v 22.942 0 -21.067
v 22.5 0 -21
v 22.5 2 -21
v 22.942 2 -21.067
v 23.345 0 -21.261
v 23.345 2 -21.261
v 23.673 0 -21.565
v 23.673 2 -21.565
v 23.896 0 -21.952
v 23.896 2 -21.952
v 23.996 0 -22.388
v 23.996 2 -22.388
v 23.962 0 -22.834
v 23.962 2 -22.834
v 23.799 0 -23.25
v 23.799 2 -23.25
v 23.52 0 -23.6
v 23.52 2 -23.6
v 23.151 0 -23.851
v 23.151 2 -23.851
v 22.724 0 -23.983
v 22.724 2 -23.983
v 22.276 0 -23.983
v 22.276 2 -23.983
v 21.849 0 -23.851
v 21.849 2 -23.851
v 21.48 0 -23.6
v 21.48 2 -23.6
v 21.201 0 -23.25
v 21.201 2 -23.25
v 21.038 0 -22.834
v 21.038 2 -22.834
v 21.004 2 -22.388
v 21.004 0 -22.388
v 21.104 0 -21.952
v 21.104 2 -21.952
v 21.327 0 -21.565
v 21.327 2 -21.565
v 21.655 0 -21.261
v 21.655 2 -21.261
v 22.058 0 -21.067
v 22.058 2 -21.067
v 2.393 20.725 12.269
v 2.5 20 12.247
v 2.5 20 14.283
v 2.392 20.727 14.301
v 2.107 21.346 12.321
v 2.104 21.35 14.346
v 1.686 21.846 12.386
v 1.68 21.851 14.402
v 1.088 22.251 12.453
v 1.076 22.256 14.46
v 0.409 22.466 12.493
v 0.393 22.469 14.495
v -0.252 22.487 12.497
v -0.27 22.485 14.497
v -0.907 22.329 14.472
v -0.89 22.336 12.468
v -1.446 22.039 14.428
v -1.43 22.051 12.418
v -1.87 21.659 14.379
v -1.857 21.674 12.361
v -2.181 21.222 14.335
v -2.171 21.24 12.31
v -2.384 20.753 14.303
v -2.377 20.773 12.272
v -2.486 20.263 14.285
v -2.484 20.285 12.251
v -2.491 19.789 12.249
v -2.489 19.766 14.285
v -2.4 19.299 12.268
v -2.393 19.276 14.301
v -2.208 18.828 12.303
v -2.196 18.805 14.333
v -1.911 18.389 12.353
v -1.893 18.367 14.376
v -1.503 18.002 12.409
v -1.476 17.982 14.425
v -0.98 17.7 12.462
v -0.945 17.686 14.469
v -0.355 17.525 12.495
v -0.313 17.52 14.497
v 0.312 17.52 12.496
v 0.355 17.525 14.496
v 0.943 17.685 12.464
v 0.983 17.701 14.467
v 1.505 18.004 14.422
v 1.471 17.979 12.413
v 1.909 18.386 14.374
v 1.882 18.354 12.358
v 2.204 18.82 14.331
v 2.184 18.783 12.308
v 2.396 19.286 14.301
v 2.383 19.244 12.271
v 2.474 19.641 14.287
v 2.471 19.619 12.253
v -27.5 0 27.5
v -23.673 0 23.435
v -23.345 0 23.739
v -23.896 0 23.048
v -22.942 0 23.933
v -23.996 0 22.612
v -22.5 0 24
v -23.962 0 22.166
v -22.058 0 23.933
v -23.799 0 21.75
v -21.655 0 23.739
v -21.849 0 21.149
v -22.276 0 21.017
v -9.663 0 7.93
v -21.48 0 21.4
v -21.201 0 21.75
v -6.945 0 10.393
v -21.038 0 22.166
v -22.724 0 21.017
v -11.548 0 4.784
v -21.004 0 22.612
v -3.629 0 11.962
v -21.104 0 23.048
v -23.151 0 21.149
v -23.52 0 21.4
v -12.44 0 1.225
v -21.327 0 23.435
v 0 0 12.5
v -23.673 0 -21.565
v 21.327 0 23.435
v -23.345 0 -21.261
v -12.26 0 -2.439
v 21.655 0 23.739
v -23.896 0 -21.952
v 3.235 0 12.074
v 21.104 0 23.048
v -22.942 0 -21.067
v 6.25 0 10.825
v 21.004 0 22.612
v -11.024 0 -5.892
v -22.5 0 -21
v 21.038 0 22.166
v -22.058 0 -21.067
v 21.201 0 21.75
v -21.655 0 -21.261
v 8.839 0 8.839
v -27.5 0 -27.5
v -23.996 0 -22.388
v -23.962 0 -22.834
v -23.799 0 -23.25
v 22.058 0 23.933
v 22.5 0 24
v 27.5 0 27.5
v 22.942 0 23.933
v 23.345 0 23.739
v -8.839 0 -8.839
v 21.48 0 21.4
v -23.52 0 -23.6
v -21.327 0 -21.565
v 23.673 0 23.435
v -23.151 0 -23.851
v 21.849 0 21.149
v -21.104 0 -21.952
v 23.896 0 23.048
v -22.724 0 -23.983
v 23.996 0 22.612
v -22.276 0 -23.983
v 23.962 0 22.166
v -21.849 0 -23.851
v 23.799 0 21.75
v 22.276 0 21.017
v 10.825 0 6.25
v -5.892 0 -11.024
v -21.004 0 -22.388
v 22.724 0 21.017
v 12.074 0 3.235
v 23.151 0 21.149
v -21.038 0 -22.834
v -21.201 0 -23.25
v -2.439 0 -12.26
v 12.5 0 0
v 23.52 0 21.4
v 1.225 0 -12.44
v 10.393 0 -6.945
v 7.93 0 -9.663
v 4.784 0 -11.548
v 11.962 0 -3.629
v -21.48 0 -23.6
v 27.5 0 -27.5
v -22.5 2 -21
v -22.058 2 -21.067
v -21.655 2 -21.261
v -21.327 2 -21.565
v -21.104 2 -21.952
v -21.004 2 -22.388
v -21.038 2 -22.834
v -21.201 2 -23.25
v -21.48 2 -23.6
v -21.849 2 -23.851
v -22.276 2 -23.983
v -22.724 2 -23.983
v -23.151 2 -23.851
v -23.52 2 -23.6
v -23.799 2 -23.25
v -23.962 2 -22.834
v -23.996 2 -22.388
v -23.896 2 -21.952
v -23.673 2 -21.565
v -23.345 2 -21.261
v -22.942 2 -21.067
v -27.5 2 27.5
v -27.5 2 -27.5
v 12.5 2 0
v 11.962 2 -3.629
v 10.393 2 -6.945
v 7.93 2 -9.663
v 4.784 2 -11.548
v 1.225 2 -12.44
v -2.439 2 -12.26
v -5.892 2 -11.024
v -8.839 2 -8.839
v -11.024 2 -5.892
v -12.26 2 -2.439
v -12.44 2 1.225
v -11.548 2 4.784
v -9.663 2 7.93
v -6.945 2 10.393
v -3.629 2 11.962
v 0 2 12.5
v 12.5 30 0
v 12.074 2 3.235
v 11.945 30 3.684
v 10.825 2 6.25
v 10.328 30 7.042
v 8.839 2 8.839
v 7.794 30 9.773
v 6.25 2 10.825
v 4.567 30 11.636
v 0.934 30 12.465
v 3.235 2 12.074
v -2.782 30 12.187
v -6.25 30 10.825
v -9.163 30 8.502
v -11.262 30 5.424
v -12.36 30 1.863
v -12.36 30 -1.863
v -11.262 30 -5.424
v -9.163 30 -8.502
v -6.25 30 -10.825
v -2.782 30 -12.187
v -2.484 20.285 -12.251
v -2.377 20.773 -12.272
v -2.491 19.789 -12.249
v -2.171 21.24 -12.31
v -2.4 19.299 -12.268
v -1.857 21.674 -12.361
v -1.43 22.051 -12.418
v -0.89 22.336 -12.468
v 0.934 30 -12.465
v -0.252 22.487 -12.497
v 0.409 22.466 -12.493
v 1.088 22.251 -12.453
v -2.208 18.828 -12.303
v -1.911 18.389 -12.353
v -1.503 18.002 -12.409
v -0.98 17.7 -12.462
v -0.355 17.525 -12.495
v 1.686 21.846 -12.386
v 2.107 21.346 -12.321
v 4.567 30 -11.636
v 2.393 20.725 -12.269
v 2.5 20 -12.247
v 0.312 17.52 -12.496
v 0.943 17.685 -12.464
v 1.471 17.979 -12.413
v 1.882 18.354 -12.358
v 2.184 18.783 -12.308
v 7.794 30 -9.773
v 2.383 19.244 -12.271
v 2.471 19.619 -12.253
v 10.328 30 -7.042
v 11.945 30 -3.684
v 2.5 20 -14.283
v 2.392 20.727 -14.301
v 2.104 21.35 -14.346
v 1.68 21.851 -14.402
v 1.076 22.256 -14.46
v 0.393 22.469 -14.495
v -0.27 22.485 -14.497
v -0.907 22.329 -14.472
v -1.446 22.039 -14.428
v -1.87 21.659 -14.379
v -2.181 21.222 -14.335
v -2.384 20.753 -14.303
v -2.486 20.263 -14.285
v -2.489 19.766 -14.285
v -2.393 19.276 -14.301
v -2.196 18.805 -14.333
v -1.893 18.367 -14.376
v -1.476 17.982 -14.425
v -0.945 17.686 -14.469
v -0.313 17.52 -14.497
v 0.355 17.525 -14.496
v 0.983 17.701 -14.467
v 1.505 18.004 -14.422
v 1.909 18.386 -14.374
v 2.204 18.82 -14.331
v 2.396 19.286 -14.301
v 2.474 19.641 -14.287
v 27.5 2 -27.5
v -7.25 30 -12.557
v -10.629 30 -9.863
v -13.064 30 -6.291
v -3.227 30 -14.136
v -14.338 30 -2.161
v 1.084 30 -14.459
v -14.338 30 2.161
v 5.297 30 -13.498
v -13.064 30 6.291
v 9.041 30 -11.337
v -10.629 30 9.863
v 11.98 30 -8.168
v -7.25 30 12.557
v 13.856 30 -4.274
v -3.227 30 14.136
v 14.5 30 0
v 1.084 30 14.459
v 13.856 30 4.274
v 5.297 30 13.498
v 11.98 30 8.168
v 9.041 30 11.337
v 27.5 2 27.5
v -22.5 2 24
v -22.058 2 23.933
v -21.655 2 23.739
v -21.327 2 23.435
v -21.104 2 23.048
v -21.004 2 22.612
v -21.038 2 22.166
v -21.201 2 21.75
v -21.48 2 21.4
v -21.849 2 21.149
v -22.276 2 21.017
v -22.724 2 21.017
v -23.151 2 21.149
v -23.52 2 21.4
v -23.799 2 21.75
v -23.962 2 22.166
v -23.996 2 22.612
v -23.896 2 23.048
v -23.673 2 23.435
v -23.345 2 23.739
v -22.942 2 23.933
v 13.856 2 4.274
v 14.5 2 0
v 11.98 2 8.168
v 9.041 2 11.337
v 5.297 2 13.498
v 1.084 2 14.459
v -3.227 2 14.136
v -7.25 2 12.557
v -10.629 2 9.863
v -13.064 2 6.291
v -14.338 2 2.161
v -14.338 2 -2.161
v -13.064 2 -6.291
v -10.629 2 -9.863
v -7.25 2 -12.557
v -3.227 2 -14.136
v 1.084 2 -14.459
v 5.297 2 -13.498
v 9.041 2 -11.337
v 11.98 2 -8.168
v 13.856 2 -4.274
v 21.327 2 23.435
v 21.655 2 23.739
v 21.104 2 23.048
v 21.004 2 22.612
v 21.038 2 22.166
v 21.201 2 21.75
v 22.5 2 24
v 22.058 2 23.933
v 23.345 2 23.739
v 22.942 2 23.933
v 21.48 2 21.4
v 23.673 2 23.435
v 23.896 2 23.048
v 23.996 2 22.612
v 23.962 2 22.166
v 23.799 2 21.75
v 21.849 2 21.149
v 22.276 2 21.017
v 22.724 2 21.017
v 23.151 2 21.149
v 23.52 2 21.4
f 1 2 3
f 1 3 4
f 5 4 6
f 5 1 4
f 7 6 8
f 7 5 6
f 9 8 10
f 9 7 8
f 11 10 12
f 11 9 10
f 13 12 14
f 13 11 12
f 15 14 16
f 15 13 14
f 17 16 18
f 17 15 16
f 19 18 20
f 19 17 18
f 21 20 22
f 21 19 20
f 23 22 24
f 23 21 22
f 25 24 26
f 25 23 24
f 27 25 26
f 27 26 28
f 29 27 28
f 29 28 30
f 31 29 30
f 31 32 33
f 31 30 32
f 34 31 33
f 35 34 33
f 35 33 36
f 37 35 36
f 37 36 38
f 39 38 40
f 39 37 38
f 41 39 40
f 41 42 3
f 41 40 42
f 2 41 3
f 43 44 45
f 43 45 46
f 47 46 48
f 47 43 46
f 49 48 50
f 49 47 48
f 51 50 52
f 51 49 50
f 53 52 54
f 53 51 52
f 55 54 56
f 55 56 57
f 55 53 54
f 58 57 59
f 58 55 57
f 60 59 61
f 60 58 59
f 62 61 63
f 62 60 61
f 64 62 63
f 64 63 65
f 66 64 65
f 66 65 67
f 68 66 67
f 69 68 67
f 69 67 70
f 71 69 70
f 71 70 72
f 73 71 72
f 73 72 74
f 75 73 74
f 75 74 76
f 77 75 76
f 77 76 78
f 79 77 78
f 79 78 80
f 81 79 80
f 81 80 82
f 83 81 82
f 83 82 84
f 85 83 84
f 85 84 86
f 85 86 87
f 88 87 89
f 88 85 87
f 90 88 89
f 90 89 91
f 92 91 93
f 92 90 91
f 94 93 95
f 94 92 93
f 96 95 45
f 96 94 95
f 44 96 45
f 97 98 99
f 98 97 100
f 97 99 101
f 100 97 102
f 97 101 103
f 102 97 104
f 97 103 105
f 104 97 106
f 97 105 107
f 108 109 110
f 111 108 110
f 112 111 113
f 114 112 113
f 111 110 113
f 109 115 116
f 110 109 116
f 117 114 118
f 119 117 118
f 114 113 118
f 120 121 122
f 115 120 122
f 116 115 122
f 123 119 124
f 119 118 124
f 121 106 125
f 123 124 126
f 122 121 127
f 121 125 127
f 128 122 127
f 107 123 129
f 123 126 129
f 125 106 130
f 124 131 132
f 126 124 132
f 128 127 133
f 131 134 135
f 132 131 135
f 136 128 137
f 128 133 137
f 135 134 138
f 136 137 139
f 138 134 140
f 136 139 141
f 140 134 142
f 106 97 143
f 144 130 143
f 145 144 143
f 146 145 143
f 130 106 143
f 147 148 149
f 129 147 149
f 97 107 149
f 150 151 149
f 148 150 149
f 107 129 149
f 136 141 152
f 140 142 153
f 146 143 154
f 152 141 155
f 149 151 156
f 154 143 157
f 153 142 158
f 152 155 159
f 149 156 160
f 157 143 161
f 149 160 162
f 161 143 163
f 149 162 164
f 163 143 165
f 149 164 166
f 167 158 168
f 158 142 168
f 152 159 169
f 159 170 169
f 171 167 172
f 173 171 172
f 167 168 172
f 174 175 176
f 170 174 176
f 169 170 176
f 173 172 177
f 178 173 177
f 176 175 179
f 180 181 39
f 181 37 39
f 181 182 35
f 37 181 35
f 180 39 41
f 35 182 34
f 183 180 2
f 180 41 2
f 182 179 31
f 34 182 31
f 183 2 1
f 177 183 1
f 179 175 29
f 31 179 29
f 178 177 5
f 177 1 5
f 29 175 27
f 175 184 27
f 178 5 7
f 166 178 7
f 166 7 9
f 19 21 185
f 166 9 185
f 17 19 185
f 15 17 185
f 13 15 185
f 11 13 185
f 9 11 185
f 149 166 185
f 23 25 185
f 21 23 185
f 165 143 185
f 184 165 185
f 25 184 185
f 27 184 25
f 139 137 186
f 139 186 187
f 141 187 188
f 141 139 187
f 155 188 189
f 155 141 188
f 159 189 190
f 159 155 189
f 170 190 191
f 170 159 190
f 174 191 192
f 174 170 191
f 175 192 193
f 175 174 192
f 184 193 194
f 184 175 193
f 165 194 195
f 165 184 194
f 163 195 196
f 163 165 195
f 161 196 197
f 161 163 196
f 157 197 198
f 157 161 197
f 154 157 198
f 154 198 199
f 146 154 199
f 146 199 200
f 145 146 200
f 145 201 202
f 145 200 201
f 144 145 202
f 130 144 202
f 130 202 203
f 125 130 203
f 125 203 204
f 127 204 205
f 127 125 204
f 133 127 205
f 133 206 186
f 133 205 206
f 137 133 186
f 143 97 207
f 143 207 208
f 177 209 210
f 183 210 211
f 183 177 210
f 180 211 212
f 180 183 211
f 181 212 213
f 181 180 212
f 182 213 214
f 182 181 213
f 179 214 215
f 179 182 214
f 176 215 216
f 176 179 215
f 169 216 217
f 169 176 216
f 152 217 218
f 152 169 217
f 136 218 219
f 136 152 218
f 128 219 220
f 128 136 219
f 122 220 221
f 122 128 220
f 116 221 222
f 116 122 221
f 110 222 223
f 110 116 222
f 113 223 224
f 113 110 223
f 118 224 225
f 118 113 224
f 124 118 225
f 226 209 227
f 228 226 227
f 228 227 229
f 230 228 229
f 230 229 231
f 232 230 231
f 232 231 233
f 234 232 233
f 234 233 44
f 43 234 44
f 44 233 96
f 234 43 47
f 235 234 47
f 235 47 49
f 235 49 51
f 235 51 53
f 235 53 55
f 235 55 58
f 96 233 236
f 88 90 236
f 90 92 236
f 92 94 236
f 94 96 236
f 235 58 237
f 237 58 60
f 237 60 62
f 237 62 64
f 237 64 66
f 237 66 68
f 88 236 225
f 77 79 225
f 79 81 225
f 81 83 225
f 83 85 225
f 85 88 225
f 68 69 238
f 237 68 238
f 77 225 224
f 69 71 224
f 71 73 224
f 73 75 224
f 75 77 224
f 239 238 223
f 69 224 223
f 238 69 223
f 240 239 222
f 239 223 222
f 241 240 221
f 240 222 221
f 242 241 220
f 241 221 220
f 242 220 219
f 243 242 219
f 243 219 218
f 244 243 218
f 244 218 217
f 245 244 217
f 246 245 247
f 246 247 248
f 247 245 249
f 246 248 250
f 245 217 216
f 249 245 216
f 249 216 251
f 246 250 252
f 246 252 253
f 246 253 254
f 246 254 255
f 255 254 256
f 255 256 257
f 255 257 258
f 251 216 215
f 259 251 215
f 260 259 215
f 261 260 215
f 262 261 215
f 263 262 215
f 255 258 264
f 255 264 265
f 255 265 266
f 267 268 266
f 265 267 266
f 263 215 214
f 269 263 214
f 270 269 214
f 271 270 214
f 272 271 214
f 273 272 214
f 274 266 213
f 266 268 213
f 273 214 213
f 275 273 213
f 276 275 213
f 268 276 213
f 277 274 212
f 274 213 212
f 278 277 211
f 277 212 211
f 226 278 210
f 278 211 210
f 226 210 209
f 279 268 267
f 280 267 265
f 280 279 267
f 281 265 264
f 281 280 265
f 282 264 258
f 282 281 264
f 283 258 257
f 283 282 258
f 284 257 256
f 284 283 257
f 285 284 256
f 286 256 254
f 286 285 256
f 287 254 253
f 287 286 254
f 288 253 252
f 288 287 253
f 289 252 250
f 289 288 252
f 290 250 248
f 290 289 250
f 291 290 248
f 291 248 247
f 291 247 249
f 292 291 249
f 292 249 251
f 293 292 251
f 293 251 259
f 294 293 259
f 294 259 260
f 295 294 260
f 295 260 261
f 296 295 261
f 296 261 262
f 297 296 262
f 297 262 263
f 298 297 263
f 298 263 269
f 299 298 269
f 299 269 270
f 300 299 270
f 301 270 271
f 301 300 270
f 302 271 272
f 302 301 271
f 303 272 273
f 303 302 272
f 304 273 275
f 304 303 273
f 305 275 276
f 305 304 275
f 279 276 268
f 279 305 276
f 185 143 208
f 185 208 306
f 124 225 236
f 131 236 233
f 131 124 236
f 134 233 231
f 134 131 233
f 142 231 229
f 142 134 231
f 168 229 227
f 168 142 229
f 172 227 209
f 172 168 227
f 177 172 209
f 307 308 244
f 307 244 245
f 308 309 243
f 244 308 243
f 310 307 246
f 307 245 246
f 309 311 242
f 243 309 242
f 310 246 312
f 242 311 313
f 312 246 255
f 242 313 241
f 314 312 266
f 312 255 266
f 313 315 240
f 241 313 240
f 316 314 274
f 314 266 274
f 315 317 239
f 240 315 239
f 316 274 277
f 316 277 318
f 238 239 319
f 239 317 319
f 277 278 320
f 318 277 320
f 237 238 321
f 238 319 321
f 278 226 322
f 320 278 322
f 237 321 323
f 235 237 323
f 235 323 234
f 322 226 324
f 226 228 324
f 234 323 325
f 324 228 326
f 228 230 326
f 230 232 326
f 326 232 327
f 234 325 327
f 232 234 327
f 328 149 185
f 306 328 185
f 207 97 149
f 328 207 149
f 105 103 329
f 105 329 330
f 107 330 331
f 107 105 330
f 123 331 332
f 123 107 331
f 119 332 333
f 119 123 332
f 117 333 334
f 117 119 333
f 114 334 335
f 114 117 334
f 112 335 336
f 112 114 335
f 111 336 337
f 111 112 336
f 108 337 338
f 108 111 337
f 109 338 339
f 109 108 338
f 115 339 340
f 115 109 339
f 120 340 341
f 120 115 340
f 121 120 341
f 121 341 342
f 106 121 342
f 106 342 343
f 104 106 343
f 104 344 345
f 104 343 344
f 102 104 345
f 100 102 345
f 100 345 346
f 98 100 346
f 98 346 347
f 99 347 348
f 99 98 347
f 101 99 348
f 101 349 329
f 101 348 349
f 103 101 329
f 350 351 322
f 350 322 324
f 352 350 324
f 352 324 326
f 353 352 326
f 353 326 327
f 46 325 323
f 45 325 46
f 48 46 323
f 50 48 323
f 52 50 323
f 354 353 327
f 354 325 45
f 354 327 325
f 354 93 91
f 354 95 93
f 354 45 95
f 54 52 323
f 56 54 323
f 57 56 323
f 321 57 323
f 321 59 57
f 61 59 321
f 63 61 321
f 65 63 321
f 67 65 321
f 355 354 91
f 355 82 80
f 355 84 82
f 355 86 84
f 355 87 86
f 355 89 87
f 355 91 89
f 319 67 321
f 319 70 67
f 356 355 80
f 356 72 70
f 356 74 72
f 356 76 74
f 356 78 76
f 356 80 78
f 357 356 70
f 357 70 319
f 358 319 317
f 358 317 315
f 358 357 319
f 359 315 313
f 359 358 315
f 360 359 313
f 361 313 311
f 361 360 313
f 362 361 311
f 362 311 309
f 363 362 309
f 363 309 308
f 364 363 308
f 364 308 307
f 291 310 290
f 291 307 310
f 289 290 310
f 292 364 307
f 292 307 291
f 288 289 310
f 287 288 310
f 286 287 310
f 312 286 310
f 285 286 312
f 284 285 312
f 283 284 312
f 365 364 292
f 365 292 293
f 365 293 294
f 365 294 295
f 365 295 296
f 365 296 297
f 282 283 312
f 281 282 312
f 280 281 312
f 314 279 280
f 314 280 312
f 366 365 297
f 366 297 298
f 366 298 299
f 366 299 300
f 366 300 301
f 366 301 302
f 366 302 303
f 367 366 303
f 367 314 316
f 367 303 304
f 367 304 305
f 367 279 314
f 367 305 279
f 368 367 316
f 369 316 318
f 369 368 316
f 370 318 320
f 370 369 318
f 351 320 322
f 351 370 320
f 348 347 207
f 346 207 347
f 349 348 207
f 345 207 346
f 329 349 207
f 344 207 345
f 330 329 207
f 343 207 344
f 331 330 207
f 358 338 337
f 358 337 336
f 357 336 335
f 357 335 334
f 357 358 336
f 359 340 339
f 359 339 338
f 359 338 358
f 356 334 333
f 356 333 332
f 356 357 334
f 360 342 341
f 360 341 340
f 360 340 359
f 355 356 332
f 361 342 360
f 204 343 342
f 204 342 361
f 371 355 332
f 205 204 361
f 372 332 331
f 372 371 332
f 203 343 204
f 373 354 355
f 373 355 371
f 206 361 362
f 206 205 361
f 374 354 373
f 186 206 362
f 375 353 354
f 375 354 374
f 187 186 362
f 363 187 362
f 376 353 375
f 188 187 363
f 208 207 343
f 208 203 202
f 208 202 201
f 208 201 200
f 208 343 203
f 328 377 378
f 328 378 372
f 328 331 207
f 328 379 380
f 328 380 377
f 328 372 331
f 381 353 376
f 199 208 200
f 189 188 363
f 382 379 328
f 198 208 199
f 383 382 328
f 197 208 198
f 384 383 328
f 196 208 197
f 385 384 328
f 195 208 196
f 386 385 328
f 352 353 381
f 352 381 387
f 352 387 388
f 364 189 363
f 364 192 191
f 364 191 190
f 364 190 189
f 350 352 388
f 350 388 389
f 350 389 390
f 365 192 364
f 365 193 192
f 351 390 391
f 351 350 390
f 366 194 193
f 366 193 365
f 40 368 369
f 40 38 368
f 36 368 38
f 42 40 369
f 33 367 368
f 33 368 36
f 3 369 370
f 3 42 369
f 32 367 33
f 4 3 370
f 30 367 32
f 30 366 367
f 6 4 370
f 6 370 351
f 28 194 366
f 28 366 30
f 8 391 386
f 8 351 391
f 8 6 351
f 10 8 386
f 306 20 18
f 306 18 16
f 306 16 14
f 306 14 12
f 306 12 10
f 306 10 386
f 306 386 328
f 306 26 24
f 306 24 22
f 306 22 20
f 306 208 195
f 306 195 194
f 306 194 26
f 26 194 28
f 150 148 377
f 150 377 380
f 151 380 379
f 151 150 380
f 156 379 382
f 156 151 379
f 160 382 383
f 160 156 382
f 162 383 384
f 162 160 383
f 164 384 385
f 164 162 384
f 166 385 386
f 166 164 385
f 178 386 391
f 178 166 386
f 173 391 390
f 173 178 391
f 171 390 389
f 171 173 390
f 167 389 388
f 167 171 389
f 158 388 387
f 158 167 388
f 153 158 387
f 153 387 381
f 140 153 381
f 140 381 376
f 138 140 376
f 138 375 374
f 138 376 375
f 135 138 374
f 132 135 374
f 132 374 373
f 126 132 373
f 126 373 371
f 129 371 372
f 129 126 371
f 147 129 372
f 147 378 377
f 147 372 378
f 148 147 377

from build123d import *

# Parameters (mm, degrees)
SKETCH_1_W               = 55
SKETCH_1_H               = 55
SKETCH_1_R               = 12.5
EXTRUDE_1_DEPTH          = 2
SKETCH_2_R               = 14.5
SKETCH_2_R_2             = 12.5
EXTRUDE_1_2_DEPTH        = 30
CUT_EXTRUDE_1_DEPTH      = 50.117206761
CUT_EXTRUDE_1_DEPTH_BACK = 50.117206761
SKETCH_3_R               = 2.5
CUT_EXTRUDE_7_DEPTH      = 50.117206822
CUT_EXTRUDE_7_DEPTH_BACK = 50.117206822
SKETCH_4_R               = 1.5


with BuildPart() as part:
    # Эскиз1 → Extrude 1 (new body)
    with BuildSketch(Plane(origin=(0, 0, 0), x_dir=(1, 0, 0), z_dir=(0, 1, 0))):
        Rectangle(SKETCH_1_W, SKETCH_1_H)
        with Locations(Location((0, 0, 0), (0, 0, 270))):
            Circle(SKETCH_1_R, mode=Mode.SUBTRACT)
    extrude(amount=EXTRUDE_1_DEPTH)

    # Эскиз2 → Extrude 1 2 (add)
    with BuildSketch(Plane.XZ):
        Circle(SKETCH_2_R)
        Circle(SKETCH_2_R_2, mode=Mode.SUBTRACT)
    extrude(amount=-EXTRUDE_1_2_DEPTH)

    # Эскиз3 → Вырез-Вытянуть1 (cut, two sides: drawn at the far end of the back side and taken through both)
    with BuildSketch(Plane.XY.offset(-CUT_EXTRUDE_1_DEPTH_BACK)):
        with Locations((0, 20)):
            Circle(SKETCH_3_R)
    extrude(amount=CUT_EXTRUDE_1_DEPTH + CUT_EXTRUDE_1_DEPTH_BACK, mode=Mode.SUBTRACT)

    # Эскиз4 → Вырез-Вытянуть7 (cut, two sides: drawn at the far end of the back side and taken through both)
    with BuildSketch(Plane(origin=(0, 0, 0), x_dir=(1, 0, 0), z_dir=(0, 1, 0)).offset(-CUT_EXTRUDE_7_DEPTH_BACK)):
        with Locations(Location((-22.5, 22.5, 0), (0, 0, 270))):
            Circle(SKETCH_4_R)
        with Locations(Location((22.5, 22.5, 0), (0, 0, 270))):
            Circle(SKETCH_4_R)
        with Locations(Location((22.5, -22.5, 0), (0, 0, 270))):
            Circle(SKETCH_4_R)
        with Locations(Location((-22.5, -22.5, 0), (0, 0, 270))):
            Circle(SKETCH_4_R)
    extrude(amount=CUT_EXTRUDE_7_DEPTH + CUT_EXTRUDE_7_DEPTH_BACK, mode=Mode.SUBTRACT)


solid = part.part
